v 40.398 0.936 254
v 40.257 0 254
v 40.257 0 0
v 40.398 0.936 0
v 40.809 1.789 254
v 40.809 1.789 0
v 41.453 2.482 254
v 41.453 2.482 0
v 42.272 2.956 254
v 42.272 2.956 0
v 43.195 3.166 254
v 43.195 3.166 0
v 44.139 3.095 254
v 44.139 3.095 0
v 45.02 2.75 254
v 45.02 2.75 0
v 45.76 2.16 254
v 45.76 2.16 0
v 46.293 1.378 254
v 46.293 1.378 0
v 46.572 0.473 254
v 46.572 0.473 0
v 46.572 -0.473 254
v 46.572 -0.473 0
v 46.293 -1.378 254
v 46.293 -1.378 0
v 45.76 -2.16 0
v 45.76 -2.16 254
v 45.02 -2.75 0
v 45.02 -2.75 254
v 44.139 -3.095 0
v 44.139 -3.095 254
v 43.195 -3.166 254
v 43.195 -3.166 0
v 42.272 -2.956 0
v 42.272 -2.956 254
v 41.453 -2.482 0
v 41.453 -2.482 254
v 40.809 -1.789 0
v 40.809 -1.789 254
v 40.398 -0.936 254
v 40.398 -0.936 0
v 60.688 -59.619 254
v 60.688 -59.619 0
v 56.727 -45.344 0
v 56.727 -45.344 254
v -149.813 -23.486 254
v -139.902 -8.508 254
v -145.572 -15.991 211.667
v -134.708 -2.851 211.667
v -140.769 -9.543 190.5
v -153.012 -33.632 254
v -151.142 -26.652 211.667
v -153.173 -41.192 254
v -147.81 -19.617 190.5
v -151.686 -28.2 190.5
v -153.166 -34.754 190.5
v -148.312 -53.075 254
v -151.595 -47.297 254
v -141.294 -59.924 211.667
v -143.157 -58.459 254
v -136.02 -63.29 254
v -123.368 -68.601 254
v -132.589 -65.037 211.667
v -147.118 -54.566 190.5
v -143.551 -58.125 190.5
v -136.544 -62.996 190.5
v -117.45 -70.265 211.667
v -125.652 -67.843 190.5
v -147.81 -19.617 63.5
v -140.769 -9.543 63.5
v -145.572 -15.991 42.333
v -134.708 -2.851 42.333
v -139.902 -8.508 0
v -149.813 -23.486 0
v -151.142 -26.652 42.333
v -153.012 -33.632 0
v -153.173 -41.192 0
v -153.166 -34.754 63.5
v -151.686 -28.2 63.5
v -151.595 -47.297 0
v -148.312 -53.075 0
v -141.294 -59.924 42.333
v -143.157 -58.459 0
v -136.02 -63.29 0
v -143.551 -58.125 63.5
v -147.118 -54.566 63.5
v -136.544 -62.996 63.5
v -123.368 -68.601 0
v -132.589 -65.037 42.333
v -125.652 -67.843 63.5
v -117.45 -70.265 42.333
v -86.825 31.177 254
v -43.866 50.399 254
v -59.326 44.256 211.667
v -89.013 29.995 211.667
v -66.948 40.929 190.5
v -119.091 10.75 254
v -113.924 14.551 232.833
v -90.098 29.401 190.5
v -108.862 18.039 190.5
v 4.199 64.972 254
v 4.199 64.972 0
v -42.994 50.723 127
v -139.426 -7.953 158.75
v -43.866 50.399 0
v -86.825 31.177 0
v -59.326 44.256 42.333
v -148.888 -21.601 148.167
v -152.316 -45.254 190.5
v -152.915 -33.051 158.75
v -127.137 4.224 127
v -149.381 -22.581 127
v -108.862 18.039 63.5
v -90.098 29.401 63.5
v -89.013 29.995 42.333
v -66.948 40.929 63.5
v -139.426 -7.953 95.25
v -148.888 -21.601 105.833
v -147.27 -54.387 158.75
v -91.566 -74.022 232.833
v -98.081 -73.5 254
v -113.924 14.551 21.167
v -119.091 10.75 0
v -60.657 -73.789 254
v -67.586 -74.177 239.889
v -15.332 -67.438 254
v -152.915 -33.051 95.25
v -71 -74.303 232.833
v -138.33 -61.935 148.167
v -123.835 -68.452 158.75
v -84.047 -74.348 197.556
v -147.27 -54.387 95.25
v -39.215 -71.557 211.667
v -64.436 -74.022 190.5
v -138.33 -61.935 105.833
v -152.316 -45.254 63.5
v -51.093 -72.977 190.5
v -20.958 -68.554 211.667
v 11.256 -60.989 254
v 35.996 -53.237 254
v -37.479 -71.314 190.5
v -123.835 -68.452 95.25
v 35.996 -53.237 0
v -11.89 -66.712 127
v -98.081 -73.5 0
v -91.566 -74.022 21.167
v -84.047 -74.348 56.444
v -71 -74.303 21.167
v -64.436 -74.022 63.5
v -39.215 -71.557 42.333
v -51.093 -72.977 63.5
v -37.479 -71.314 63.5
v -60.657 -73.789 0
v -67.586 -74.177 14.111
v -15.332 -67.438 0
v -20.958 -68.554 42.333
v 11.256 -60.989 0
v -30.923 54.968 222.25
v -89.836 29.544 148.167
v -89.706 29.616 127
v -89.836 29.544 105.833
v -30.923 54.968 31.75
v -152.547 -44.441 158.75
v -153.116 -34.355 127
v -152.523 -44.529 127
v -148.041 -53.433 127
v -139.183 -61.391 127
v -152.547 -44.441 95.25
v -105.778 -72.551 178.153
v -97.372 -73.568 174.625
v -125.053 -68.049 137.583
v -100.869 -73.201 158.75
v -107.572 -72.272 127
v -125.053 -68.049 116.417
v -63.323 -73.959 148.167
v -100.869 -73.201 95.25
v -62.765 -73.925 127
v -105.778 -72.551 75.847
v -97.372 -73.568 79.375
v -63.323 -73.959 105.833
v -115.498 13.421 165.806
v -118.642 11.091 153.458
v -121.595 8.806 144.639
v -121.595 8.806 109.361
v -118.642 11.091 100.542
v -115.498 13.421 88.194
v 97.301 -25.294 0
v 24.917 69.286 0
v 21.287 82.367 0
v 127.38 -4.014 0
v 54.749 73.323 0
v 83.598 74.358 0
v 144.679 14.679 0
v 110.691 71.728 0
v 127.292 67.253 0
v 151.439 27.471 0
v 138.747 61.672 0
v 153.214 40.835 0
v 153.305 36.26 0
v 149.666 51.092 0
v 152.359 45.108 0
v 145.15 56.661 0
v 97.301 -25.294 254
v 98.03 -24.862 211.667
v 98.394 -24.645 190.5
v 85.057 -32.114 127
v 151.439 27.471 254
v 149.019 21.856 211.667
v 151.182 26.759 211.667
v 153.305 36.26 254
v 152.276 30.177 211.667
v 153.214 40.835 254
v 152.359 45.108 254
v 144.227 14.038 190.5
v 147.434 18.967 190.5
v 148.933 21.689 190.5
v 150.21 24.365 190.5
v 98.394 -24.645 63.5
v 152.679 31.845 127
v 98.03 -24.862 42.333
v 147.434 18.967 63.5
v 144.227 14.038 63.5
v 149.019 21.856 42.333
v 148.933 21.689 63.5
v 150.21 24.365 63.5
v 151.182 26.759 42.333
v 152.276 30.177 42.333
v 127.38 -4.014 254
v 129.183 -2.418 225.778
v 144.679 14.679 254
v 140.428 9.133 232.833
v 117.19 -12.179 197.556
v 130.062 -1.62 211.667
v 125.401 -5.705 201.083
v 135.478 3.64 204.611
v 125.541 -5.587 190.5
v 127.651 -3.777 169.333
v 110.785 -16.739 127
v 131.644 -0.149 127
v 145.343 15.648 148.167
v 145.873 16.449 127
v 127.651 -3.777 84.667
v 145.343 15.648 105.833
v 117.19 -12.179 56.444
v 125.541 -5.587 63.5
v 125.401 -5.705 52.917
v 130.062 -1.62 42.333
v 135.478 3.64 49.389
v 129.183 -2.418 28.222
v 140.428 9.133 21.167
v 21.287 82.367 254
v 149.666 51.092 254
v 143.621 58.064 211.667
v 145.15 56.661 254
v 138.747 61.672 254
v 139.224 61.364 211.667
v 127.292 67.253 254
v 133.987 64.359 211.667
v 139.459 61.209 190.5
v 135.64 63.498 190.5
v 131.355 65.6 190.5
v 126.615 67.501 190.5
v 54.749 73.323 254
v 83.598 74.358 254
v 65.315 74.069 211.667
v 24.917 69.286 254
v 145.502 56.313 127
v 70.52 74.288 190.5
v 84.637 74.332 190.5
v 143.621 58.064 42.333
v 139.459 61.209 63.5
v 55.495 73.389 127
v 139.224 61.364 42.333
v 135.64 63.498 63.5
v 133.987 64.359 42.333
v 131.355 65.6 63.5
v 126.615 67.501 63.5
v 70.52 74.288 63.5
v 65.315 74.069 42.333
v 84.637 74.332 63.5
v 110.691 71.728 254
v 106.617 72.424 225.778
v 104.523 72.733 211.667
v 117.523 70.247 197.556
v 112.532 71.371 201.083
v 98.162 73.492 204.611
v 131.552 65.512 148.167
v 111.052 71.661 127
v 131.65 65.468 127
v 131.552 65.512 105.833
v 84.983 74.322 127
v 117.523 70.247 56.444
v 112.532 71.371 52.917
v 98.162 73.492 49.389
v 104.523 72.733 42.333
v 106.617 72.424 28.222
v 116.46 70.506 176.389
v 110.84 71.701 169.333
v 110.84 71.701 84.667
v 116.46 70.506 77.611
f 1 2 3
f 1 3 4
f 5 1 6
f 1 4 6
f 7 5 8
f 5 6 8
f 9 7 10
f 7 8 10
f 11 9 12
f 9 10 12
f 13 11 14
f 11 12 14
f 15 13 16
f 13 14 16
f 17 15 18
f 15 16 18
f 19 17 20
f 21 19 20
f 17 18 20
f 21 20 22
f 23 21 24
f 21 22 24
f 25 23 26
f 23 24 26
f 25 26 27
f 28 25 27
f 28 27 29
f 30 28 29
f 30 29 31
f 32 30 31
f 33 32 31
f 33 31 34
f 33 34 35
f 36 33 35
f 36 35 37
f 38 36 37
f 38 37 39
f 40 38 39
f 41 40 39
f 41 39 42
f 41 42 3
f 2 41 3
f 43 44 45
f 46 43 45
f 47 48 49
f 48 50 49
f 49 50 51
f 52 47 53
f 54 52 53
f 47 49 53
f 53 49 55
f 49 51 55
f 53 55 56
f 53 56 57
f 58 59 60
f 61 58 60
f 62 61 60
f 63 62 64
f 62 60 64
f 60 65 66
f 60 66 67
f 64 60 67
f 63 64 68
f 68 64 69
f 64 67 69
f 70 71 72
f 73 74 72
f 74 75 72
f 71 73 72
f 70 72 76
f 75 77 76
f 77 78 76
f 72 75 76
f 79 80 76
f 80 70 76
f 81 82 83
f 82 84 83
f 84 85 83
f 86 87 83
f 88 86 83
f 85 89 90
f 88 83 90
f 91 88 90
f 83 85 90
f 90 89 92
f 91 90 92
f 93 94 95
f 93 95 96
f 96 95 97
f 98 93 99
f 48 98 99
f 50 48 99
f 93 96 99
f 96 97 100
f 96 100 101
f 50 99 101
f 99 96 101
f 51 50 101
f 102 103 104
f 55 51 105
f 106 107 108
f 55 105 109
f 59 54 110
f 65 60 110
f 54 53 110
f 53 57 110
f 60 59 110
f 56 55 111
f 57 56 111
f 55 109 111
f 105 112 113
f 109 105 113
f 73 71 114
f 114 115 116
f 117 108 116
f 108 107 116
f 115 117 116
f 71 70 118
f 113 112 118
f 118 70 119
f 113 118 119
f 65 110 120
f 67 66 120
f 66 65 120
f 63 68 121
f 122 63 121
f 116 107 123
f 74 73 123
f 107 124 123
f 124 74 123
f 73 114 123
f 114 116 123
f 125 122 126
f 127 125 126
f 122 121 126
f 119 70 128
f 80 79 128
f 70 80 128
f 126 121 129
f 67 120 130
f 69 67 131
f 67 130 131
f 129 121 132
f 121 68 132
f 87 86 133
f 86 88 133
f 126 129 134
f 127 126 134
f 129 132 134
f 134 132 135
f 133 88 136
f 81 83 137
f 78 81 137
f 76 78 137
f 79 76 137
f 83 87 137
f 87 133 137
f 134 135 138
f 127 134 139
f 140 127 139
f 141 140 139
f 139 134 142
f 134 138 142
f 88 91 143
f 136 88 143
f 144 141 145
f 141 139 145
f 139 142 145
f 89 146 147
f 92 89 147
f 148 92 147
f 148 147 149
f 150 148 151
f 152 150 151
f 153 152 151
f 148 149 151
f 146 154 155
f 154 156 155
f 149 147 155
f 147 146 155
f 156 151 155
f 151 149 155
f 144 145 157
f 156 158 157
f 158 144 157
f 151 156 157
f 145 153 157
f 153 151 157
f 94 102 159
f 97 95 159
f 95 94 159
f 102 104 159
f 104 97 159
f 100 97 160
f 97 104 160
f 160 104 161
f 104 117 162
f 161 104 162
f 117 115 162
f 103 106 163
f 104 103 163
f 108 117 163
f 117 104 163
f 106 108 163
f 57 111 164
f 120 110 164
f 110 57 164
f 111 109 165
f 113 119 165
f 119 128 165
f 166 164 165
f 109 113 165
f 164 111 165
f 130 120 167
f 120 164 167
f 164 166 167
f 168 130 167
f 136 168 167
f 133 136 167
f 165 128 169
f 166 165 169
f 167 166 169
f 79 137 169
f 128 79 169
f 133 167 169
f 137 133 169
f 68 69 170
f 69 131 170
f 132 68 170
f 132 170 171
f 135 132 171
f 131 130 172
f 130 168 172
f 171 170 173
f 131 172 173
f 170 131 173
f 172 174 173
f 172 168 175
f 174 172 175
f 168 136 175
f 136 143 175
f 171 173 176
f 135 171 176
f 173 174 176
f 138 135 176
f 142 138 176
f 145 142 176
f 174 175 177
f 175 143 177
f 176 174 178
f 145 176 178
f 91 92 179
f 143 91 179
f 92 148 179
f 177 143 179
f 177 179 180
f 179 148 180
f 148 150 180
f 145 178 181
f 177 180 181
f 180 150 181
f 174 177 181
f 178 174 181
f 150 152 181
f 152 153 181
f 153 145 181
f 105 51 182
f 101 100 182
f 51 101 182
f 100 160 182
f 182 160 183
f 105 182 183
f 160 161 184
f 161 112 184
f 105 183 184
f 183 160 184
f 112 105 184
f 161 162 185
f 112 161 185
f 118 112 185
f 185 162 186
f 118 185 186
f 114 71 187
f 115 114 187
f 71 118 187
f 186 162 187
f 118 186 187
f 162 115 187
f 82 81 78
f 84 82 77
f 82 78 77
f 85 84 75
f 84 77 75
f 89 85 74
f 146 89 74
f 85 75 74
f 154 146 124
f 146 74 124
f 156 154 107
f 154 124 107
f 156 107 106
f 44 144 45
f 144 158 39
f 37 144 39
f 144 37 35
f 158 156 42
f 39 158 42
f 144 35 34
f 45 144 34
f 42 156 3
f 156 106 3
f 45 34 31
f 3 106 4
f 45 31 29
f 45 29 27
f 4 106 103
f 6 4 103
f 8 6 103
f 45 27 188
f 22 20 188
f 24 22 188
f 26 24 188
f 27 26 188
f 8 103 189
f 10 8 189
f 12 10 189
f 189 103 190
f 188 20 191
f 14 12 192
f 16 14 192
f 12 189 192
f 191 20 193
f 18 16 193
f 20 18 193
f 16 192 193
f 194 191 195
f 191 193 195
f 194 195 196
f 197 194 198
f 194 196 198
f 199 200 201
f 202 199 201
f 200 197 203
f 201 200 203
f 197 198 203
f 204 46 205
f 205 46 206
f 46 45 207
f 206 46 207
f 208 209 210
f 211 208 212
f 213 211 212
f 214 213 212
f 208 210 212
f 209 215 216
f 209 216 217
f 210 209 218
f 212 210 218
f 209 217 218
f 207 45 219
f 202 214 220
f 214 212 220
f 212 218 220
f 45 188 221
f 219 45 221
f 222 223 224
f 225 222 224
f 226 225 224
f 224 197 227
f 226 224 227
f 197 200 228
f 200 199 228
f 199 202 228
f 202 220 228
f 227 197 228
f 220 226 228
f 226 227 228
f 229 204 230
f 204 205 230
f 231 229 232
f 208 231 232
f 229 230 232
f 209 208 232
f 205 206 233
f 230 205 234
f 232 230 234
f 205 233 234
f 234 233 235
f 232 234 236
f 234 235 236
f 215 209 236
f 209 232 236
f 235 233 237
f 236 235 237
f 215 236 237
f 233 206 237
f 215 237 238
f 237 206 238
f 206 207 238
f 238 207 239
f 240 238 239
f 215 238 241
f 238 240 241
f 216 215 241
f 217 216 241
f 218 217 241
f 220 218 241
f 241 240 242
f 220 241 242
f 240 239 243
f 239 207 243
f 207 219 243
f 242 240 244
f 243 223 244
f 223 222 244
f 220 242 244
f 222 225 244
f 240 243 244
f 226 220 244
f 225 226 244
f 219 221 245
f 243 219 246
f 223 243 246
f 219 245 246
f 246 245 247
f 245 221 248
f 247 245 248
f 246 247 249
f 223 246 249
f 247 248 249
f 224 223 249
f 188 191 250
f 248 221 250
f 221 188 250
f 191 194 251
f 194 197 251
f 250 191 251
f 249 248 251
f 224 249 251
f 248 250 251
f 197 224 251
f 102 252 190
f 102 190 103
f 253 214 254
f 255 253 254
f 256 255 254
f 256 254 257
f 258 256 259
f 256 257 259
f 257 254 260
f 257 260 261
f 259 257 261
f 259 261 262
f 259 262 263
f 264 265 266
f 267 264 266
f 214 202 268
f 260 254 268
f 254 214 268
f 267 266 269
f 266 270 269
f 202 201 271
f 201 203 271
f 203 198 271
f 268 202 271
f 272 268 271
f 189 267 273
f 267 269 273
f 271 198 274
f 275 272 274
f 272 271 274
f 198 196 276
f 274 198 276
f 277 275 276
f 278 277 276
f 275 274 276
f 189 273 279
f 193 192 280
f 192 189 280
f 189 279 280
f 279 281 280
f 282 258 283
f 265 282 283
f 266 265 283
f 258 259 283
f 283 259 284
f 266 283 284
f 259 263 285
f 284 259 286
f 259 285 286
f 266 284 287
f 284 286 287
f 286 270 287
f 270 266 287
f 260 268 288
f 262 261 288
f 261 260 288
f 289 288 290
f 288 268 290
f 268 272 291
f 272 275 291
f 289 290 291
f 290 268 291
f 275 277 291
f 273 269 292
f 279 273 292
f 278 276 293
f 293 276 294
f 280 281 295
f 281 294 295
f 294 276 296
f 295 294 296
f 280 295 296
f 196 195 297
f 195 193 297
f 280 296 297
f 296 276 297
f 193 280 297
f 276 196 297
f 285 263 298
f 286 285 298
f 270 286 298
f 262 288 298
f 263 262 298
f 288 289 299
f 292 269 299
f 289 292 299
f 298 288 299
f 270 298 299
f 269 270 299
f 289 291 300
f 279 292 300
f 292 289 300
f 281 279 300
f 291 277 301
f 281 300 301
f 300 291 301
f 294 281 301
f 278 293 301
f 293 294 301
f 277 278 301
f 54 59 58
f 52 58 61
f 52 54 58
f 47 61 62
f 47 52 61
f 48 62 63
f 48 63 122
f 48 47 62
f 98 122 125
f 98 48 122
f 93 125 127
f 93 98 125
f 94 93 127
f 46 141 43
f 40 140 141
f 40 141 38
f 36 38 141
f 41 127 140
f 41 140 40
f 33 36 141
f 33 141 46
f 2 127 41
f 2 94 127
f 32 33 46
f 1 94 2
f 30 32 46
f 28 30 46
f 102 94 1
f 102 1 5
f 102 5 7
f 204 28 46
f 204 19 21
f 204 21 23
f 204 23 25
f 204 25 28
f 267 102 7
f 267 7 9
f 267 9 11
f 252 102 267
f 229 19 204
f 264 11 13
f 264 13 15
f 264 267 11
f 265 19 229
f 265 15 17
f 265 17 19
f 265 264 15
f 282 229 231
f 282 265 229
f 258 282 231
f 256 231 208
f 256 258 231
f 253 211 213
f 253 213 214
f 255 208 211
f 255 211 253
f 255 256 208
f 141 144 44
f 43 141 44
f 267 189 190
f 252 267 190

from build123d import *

# Parameters (mm, degrees)
F1_DEPTH = 254
F8_D     = 6.35


with BuildPart() as f1:
    # F0 (on Top) → F1 (new body)
    with BuildSketch(Plane.XY):
        with BuildLine():
            add(Edge.make_bspline(
                [(56.7267649586, -45.3442428128), (165.7697287487, -0.1871238141), (152.3593788969, 45.10822266)],
                knots=[4.9767626348, 4.9767626348, 4.9767626348, 6.2831853072, 6.2831853072, 6.2831853072], degree=2, weights=[1, 0.79413624, 1]))
            add(Edge.make_bspline(
                [(152.3593788969, 45.10822266), (139.1332845807, 89.7812200962), (24.9170021831, 69.2863295536)],
                knots=[0, 0, 0, 1.2930927927, 1.2930927927, 1.2930927927], degree=2, weights=[1, 0.7981691208, 1]))
            Line((24.9170021831, 69.2863295535), (56.7267649586, -45.3442428128))
        make_face()
        with BuildLine():
            Line((56.7267649586, -45.3442428128), (24.9170021831, 69.2863295535))
            add(Edge.make_bspline(
                [(24.9170021831, 69.2863295536), (14.6254096305, 67.4396133197), (4.1991469211, 64.9719159626)],
                knots=[1.2930927927, 1.2930927927, 1.2930927927, 1.4289023934, 1.4289023934, 1.4289023934], degree=2, weights=[1, 0.9976953548, 1]))
            Line((4.1991469211, 64.9719159626), (-81.9751396775, -22.7479431778))
            Line((-81.9751396775, -22.7479431778), (35.995592068, -53.2369700128))
            add(Edge.make_bspline(
                [(35.995592068, -53.2369700128), (46.5955617331, -49.5397996259), (56.7267649586, -45.3442428128)],
                knots=[4.834796177, 4.834796177, 4.834796177, 4.9767626348, 4.9767626348, 4.9767626348], degree=2, weights=[1, 0.9974817482, 1]))
        make_face()
        with BuildLine():
            add(Edge.make_bspline(
                [(24.9170021831, 69.2863295536), (14.6254096305, 67.4396133197), (4.1991469211, 64.9719159626)],
                knots=[1.2930927927, 1.2930927927, 1.2930927927, 1.4289023934, 1.4289023934, 1.4289023934], degree=2, weights=[1, 0.9976953548, 1]))
            Line((24.9170021831, 69.2863295535), (21.2872731629, 82.3665250284))
            Line((21.2872731629, 82.3665250284), (4.1991469211, 64.9719159626))
        make_face()
        with BuildLine():
            Line((60.6878665146, -59.6185818506), (56.7267649586, -45.3442428128))
            add(Edge.make_bspline(
                [(35.995592068, -53.2369700128), (46.5955617331, -49.5397996259), (56.7267649586, -45.3442428128)],
                knots=[4.834796177, 4.834796177, 4.834796177, 4.9767626348, 4.9767626348, 4.9767626348], degree=2, weights=[1, 0.9974817482, 1]))
            Line((35.995592068, -53.2369700128), (60.6878665146, -59.6185818506))
        make_face()
        with BuildLine():
            Line((-81.9751396775, -22.7479431778), (4.1991469211, 64.9719159626))
            add(Edge.make_bspline(
                [(4.1991469211, 64.9719159626), (-170.8338745759, 23.5449409679), (-152.5228808522, -44.5294037957), (-134.2118871284, -112.6037485592), (35.995592068, -53.2369700128)],
                knots=[1.4289023934, 1.4289023934, 1.4289023934, 3.1318492852, 3.1318492852, 4.834796177, 4.834796177, 4.834796177], degree=2, weights=[1, 0.6588754588, 1, 0.6588754588, 1]))
            Line((35.995592068, -53.2369700128), (-81.9751396775, -22.7479431778))
        make_face()
    extrude(amount=F1_DEPTH)

    # F8 (through all)
    with Locations(Plane.XY.offset(254)):
        with Locations((43.4321761131, 0)):
            Hole(F8_D / 2)


solid = f1.part
